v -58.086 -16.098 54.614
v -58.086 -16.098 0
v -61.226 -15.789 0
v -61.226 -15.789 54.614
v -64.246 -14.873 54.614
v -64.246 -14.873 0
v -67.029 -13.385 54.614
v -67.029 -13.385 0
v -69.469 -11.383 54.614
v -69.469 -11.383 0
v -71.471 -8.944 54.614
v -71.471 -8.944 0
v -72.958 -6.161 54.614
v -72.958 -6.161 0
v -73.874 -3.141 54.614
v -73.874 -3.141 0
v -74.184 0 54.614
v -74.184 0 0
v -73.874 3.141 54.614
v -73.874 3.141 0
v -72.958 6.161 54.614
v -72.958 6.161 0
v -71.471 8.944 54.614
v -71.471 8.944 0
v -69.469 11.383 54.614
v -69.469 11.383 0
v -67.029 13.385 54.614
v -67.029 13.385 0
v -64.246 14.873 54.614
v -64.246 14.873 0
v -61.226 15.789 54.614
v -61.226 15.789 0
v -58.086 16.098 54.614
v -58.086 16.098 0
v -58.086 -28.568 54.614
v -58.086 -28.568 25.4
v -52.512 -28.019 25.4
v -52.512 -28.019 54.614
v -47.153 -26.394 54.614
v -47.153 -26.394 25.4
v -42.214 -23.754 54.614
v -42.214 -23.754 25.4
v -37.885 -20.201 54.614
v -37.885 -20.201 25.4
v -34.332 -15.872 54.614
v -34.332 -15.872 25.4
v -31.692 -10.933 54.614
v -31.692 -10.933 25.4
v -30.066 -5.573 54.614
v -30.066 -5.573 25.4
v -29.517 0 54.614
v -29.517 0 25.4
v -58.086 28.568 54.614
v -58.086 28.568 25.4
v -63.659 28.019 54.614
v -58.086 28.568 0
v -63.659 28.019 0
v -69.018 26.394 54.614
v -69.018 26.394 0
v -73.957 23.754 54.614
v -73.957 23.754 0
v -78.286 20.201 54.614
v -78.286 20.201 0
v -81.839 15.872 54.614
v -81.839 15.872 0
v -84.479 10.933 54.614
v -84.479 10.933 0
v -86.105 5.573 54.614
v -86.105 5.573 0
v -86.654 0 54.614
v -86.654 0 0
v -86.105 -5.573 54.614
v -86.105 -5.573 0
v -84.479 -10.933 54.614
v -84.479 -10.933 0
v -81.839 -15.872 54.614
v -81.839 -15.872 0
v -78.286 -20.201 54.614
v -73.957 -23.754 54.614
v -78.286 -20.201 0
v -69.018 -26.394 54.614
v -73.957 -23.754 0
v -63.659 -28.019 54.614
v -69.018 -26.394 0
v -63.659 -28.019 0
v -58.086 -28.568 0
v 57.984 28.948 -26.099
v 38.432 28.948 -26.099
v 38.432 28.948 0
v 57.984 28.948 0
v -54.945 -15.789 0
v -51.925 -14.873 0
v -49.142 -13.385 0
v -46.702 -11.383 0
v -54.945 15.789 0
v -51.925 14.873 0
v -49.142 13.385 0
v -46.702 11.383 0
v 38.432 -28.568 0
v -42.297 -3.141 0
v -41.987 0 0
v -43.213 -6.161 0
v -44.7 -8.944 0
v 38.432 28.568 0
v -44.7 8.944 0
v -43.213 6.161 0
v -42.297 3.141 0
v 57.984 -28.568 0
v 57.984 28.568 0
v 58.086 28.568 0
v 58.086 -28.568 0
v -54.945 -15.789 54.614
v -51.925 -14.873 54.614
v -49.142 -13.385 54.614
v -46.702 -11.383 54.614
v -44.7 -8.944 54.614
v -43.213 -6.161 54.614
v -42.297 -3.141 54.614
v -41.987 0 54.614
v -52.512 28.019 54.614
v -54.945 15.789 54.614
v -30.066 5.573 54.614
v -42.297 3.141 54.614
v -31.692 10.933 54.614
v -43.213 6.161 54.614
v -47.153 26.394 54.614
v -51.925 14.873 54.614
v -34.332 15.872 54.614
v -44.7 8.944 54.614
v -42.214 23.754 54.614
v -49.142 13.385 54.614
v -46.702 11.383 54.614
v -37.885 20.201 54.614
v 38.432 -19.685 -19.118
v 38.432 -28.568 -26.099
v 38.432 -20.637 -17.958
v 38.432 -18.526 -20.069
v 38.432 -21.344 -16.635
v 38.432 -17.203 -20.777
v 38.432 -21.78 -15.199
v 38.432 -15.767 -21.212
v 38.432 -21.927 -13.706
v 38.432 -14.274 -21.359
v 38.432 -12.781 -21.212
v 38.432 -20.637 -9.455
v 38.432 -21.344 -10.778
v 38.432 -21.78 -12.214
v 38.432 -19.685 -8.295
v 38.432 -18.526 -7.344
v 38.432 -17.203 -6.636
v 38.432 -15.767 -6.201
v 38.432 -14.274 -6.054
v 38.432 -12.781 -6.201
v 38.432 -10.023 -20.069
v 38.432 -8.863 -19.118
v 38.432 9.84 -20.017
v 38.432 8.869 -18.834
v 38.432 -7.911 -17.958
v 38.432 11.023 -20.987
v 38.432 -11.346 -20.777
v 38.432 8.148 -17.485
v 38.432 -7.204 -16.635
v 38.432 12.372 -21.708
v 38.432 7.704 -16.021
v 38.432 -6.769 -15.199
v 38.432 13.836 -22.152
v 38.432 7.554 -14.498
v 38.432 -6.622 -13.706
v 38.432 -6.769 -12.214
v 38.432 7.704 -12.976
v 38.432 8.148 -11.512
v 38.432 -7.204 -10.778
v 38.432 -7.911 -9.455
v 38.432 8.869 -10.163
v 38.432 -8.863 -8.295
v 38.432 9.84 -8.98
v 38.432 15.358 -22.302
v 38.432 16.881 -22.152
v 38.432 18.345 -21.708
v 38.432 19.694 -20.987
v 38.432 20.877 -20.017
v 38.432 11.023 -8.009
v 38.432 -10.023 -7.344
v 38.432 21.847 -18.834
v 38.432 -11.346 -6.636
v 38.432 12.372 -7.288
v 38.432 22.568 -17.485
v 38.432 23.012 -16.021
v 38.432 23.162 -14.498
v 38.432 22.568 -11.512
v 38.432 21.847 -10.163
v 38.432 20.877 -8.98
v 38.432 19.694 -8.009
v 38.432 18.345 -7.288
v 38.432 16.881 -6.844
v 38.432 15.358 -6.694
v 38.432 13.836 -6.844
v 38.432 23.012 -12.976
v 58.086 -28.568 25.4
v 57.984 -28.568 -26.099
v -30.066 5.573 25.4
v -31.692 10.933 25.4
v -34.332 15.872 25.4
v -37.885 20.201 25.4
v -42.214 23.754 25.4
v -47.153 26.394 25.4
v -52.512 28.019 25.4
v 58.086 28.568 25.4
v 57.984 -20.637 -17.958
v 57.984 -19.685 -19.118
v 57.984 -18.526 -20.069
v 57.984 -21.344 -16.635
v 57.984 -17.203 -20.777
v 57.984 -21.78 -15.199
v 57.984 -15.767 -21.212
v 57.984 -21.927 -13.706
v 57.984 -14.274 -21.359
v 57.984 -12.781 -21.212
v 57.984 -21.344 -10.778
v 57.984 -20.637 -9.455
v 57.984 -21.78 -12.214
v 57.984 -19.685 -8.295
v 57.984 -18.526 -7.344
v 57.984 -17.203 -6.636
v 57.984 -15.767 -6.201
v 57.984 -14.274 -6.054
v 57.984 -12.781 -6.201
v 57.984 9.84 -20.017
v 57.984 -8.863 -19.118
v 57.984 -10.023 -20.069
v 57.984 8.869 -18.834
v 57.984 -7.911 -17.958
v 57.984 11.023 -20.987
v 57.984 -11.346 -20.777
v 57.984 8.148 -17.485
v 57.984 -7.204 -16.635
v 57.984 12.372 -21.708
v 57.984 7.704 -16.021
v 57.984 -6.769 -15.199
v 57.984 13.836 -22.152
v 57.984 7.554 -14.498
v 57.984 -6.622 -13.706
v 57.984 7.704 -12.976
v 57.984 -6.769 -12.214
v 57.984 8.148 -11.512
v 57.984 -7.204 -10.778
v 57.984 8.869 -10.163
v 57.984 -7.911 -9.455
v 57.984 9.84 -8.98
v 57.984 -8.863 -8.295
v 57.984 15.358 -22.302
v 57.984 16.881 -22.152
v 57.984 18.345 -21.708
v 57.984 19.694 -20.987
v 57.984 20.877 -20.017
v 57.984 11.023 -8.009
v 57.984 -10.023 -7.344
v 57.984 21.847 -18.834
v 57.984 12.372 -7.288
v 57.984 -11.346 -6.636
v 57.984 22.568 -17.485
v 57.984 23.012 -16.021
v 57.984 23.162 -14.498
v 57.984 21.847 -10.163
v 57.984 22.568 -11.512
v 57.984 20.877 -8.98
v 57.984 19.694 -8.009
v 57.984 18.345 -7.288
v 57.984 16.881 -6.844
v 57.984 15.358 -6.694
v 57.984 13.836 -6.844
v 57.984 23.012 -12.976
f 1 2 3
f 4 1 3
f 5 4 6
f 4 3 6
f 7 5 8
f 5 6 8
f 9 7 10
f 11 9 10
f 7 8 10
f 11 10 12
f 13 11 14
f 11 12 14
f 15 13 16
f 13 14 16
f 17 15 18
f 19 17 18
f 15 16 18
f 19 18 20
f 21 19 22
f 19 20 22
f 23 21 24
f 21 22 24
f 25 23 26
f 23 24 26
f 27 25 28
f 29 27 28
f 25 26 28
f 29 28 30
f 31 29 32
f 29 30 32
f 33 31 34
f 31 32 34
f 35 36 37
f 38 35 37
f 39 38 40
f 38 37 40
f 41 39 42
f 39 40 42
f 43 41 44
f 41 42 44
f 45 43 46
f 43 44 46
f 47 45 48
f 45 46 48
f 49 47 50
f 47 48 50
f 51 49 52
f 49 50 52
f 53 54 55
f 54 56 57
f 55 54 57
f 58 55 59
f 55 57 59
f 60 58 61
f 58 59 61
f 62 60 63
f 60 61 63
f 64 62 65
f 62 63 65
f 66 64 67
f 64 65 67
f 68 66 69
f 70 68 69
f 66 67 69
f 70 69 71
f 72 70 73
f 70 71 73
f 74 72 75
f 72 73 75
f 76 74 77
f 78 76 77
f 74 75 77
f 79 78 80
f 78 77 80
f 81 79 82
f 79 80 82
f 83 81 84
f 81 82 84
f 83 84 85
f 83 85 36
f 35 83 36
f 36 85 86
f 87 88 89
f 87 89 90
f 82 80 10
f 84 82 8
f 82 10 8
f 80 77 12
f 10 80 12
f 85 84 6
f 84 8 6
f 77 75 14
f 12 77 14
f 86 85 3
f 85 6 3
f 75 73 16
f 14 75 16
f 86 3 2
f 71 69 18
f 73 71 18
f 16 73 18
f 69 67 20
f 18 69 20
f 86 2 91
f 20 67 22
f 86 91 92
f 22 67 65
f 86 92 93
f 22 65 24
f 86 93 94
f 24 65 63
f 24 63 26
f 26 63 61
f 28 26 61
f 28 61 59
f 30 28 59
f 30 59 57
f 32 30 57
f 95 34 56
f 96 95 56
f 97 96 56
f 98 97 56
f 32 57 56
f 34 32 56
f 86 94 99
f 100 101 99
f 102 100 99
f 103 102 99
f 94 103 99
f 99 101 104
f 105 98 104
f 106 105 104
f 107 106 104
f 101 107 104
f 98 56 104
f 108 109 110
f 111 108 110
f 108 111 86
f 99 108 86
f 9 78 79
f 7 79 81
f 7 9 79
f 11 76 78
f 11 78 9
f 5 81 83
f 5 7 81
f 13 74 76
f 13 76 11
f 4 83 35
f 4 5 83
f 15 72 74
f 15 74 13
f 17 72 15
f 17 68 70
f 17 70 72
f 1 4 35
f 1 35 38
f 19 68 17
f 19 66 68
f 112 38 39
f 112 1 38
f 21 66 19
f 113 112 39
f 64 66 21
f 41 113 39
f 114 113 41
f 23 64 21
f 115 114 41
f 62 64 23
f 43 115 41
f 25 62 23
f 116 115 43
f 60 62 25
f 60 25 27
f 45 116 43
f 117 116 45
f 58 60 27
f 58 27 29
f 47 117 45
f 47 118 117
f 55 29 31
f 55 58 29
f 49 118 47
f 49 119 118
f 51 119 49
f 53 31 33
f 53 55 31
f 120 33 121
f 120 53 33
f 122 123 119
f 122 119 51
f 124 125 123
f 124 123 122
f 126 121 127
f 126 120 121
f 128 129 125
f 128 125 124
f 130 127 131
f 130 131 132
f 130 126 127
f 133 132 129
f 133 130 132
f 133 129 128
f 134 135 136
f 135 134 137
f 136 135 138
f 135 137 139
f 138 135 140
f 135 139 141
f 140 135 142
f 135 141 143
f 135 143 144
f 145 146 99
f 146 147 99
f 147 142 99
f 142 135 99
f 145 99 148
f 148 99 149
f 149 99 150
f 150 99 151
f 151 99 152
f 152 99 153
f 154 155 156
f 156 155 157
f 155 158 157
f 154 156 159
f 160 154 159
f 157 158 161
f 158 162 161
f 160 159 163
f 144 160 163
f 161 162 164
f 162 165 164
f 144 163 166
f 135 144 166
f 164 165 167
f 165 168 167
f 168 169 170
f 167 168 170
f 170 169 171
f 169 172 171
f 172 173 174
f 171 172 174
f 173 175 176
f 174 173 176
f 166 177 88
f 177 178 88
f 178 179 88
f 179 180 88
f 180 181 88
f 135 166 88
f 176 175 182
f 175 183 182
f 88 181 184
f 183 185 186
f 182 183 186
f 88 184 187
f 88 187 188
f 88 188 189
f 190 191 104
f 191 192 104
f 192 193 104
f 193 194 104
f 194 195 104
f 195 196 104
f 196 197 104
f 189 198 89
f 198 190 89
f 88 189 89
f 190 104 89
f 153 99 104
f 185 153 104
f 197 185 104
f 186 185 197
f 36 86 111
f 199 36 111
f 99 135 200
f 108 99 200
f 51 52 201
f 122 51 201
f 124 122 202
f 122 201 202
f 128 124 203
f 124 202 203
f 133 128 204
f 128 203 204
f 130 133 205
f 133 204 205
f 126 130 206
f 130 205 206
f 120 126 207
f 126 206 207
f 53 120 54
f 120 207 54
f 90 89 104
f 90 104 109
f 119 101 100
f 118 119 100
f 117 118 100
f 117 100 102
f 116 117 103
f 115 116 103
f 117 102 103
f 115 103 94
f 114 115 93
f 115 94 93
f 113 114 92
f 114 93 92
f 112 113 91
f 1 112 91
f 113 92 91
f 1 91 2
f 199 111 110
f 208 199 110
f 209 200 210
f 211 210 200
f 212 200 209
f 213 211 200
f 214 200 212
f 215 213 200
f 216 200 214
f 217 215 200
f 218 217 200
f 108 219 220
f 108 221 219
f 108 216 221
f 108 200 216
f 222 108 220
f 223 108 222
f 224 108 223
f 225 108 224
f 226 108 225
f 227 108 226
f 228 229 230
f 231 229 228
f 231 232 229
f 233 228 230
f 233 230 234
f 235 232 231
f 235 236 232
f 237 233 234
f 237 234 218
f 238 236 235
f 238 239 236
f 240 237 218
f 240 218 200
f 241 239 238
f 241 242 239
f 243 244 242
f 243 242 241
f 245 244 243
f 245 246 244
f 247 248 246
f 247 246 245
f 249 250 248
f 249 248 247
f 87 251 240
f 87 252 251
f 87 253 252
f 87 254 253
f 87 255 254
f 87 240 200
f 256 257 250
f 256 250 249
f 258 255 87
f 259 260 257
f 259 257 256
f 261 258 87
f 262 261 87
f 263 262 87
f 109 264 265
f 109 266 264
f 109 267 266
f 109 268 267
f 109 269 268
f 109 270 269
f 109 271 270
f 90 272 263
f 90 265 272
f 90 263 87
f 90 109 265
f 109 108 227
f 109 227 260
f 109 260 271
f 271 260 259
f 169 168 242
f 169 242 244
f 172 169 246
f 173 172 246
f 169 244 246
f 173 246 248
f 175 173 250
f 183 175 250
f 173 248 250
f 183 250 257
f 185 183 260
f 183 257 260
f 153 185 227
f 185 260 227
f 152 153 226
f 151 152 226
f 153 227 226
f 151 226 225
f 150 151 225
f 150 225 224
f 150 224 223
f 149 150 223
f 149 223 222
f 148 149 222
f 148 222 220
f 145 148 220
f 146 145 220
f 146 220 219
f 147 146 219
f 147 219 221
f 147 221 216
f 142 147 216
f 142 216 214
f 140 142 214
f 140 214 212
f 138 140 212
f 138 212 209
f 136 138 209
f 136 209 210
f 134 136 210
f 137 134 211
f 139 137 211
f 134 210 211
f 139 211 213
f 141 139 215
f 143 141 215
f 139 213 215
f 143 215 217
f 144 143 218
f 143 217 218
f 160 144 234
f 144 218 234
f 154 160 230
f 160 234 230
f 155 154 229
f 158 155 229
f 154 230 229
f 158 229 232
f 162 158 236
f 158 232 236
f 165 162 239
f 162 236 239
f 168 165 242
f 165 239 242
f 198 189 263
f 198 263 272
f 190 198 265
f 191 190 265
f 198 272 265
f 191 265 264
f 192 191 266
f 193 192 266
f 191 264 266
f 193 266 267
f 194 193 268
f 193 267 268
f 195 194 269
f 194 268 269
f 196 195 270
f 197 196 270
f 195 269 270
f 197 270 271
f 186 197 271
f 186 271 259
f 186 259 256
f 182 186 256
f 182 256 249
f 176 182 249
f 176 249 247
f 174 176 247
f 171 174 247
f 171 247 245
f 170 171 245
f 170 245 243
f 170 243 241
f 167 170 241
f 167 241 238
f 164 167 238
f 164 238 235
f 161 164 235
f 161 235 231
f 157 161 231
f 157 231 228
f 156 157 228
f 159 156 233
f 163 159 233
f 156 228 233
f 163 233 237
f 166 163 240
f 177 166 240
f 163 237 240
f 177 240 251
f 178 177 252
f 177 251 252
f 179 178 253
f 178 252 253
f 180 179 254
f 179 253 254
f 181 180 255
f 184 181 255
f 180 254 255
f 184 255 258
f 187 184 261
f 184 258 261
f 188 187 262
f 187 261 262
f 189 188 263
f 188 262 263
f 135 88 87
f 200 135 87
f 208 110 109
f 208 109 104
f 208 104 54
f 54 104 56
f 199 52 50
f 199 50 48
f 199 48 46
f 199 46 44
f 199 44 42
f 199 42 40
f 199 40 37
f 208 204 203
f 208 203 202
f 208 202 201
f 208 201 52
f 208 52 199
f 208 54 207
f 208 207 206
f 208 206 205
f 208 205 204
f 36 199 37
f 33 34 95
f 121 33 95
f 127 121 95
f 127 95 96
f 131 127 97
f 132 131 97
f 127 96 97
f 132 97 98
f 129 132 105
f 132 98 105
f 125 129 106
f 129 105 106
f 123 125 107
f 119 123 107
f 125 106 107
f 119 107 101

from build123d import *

# Parameters (mm, degrees)
F1_DEPTH = 25.4
F2_DEPTH = 54.61407
F3_W     = 19.551679
F3_H     = 57.516087
F4_DEPTH = 26.09864
F5_R     = 7.652629
F5_R_2   = 7.80409
F6_DEPTH = 25.4


with BuildPart() as f1:
    # F0 (on Top) → F1 (new body)
    with BuildSketch(Plane.XY):
        with BuildLine():
            ThreePointArc((-29.517332, 0), (-37.88477, 20.200783), (-58.085553, 28.568221))
            Line((-58.085553, 28.568221), (-58.085553, 16.098264))
            ThreePointArc((-58.085553, 16.098264), (-46.702362, 11.383191), (-41.98729, 0))
            ThreePointArc((-41.98729, 0), (-46.702362, -11.383191), (-58.085553, -16.098264))
            Line((-58.085553, -16.098264), (-58.085553, -28.568221))
            ThreePointArc((-58.085553, -28.568221), (-37.88477, -20.200783), (-29.517332, 0))
        make_face()
        with BuildLine():
            Line((-58.085553, 16.098264), (-58.085553, 28.568221))
            ThreePointArc((-58.085553, 28.568221), (-86.653775, 0), (-58.085553, -28.568221))
            Line((-58.085553, -28.568221), (-58.085553, -16.098264))
            ThreePointArc((-58.085553, -16.098264), (-74.183817, 0), (-58.085553, 16.098264))
        make_face()
        with BuildLine():
            Line((58.085553, 28.568221), (-58.085553, 28.568221))
            ThreePointArc((-58.085553, 28.568221), (-37.88477, 20.200783), (-29.517332, 0))
            ThreePointArc((-29.517332, 0), (-37.88477, -20.200783), (-58.085553, -28.568221))
            Line((-58.085553, -28.568221), (58.085553, -28.568221))
            Line((58.085553, -28.568221), (58.085553, 28.568221))
        make_face()
    extrude(amount=F1_DEPTH)

    # F0 (on Top) → F2 (join)
    with BuildSketch(Plane.XY):
        with BuildLine():
            Line((-58.085553, 16.098264), (-58.085553, 28.568221))
            ThreePointArc((-58.085553, 28.568221), (-86.653775, 0), (-58.085553, -28.568221))
            Line((-58.085553, -28.568221), (-58.085553, -16.098264))
            ThreePointArc((-58.085553, -16.098264), (-74.183817, 0), (-58.085553, 16.098264))
        make_face()
        with BuildLine():
            ThreePointArc((-29.517332, 0), (-37.88477, 20.200783), (-58.085553, 28.568221))
            Line((-58.085553, 28.568221), (-58.085553, 16.098264))
            ThreePointArc((-58.085553, 16.098264), (-46.702362, 11.383191), (-41.98729, 0))
            ThreePointArc((-41.98729, 0), (-46.702362, -11.383191), (-58.085553, -16.098264))
            Line((-58.085553, -16.098264), (-58.085553, -28.568221))
            ThreePointArc((-58.085553, -28.568221), (-37.88477, -20.200783), (-29.517332, 0))
        make_face()
    extrude(amount=F2_DEPTH)

    # F3 (on face) → F4 (join)
    with BuildSketch(Plane.XY):
        with Locations((48.208024, 0.189823)):
            Rectangle(F3_W, F3_H)
    extrude(amount=-F4_DEPTH)

    # F5 (on face) → F6 (cut)
    with BuildSketch(Plane.YZ.offset(57.983864)):
        with Locations((-14.27424, -13.706455)):
            Circle(F5_R)
        with Locations((15.358331, -14.498299)):
            Circle(F5_R_2)
    extrude(amount=-F6_DEPTH, mode=Mode.SUBTRACT)


solid = f1.part
